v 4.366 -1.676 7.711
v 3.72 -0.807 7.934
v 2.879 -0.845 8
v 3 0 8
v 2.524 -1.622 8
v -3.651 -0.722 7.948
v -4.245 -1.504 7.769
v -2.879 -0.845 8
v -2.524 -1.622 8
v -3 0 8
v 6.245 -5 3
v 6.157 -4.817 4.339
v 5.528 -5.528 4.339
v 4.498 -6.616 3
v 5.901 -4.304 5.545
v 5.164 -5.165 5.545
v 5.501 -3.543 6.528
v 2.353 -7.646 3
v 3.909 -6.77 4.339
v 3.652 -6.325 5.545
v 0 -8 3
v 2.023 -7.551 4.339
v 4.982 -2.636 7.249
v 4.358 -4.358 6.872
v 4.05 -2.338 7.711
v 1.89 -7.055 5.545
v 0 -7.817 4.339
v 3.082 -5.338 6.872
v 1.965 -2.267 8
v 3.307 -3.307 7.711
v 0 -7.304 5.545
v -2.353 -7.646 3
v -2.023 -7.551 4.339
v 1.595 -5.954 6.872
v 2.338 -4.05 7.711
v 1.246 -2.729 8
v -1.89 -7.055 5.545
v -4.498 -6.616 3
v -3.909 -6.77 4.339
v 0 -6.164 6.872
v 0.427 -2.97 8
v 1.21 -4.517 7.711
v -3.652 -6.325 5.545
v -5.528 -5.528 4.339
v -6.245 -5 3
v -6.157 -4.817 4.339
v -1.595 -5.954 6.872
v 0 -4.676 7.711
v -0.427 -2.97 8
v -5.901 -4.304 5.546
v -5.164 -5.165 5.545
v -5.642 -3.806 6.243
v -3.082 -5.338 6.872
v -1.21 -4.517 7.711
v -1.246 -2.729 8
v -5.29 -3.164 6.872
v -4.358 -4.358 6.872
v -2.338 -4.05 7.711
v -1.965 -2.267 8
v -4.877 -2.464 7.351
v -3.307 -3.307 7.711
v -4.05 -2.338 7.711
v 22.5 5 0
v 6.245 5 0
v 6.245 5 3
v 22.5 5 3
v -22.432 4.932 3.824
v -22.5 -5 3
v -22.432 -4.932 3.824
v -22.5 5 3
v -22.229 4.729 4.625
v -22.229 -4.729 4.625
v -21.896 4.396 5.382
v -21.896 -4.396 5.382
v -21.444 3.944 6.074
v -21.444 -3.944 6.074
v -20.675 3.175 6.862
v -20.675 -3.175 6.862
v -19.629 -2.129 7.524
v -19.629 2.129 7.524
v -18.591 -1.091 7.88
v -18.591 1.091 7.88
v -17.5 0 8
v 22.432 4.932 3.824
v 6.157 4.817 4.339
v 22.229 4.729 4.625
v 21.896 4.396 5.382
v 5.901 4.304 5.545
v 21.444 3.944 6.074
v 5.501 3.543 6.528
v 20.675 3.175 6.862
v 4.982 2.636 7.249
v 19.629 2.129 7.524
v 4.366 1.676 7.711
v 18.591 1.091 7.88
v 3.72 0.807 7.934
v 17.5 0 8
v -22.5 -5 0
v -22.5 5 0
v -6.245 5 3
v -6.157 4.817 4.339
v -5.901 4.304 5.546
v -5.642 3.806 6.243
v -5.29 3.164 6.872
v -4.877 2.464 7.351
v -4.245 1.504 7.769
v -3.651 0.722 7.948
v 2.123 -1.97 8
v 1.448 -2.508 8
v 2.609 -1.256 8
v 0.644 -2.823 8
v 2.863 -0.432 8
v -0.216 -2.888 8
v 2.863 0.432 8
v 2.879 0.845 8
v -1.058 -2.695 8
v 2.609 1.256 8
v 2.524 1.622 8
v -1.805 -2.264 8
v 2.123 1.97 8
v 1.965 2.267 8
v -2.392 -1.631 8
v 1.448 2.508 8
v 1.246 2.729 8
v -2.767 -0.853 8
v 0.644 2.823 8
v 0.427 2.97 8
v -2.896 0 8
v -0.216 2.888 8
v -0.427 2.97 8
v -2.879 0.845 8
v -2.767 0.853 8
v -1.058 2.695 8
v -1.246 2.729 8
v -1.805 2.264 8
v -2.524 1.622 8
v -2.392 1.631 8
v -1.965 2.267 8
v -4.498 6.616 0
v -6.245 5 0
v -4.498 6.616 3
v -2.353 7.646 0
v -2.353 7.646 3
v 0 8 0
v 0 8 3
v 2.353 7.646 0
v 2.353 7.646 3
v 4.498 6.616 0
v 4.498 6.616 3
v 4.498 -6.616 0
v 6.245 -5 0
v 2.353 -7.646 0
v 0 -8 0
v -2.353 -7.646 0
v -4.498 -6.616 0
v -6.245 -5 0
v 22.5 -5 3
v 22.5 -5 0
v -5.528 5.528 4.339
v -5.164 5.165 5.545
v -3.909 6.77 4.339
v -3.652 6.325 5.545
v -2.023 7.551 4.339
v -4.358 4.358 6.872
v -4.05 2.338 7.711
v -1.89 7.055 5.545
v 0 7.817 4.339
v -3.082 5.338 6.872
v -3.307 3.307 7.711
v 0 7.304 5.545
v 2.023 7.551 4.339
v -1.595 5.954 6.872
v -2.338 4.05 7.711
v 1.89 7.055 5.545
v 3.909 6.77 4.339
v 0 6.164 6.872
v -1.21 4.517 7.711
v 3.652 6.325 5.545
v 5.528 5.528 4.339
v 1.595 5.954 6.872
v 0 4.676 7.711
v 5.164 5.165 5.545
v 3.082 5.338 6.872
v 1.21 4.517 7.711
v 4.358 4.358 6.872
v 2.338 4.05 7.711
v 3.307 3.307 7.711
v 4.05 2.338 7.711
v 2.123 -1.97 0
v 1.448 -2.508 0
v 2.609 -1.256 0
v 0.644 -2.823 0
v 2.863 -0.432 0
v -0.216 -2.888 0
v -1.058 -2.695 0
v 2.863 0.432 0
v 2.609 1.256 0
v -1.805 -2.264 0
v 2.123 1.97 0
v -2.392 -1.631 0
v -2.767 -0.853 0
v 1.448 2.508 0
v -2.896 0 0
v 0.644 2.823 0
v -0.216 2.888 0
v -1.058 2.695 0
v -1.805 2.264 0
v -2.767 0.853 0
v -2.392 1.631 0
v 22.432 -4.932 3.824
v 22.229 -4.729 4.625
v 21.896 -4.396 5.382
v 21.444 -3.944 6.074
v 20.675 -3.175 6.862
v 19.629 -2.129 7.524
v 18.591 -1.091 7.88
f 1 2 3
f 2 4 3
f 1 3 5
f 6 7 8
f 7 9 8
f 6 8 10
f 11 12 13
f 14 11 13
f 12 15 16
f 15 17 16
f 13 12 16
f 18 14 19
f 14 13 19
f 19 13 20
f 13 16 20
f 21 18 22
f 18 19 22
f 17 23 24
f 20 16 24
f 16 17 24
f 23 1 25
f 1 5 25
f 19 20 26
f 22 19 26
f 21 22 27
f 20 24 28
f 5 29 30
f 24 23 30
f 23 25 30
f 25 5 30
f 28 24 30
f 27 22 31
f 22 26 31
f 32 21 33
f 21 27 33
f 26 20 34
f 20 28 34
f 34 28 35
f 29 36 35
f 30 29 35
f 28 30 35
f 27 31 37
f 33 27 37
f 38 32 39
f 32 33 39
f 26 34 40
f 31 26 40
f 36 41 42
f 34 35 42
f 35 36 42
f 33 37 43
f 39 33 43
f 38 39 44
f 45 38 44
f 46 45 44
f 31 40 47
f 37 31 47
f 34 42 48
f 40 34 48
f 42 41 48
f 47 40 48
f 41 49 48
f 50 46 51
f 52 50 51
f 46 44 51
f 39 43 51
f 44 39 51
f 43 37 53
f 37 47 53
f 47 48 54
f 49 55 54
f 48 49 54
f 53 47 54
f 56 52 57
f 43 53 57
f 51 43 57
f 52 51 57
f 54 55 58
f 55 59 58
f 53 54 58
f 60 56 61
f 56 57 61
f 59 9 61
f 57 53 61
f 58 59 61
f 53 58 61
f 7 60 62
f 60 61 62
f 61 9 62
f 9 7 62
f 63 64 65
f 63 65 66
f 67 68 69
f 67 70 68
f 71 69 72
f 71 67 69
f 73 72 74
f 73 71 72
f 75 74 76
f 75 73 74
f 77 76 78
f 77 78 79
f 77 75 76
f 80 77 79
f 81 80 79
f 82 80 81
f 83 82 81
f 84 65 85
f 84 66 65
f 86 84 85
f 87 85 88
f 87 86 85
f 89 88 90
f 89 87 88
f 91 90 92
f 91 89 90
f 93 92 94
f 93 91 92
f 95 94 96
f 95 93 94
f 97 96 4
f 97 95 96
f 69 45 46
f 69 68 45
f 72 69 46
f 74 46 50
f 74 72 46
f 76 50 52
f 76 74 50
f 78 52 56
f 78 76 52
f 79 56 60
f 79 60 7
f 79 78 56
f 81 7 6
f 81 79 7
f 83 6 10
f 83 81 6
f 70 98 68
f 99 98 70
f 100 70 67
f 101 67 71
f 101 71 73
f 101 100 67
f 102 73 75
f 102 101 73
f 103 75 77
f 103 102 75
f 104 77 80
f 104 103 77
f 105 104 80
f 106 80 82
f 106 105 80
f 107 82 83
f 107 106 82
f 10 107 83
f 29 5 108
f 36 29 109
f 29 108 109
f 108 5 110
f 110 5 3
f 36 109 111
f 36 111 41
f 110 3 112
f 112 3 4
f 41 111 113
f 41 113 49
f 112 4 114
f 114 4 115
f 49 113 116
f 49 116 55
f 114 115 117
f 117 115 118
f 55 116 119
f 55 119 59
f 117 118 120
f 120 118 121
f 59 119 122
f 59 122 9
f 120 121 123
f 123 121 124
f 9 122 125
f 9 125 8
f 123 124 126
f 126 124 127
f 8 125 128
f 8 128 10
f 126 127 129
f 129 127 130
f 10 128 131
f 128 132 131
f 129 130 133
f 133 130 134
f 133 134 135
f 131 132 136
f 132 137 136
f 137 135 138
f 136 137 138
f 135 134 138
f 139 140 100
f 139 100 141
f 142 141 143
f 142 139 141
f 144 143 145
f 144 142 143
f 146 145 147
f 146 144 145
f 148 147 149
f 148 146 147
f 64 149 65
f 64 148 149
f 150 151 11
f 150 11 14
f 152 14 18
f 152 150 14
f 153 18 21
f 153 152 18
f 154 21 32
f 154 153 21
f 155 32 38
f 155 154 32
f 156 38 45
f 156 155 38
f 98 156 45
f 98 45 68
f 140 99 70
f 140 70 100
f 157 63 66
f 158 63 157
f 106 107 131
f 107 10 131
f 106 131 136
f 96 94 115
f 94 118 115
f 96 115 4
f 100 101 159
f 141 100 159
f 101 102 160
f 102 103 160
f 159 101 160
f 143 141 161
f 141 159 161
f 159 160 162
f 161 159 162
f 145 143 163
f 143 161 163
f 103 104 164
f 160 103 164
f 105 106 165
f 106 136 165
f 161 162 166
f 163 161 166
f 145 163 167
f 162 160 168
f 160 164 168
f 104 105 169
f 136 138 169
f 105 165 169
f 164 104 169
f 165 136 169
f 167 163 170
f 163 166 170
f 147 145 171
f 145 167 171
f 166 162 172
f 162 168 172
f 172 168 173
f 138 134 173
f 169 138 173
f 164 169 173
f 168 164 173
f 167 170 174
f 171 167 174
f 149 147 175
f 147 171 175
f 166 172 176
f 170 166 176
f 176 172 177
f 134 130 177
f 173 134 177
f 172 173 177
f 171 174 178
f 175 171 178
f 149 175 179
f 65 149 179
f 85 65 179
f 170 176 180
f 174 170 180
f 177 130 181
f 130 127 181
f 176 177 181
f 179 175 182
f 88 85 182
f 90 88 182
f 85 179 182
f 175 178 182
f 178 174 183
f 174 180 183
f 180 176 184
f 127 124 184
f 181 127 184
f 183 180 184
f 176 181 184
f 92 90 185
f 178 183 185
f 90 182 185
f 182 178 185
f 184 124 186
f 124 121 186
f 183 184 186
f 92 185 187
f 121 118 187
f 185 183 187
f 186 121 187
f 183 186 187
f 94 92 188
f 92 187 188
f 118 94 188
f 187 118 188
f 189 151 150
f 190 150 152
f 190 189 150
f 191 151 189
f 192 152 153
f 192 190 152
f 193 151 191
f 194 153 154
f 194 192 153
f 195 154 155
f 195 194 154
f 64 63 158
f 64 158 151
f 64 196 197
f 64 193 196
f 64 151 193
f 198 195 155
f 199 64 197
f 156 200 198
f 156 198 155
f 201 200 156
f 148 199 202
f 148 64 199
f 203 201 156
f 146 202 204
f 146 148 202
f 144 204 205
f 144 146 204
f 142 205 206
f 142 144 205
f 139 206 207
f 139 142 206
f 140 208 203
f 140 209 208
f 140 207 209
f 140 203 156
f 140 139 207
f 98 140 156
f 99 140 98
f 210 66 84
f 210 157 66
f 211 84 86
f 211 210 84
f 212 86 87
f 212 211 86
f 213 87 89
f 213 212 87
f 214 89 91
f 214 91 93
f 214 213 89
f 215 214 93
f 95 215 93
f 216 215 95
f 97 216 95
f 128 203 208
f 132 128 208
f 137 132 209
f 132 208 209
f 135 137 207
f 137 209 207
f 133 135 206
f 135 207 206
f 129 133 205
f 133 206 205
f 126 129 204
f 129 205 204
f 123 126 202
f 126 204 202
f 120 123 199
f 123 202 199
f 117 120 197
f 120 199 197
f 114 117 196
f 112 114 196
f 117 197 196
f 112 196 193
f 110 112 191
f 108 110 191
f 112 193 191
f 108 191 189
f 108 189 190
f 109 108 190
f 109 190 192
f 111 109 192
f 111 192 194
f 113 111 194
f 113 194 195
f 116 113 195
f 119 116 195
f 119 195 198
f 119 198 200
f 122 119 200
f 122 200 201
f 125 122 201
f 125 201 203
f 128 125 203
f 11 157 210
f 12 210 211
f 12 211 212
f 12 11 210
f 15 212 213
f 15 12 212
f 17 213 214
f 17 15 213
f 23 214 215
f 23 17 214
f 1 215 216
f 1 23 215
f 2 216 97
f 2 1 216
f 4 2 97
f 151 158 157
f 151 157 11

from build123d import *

# Parameters (mm, degrees)
BOSS_EXTRU_2_DEPTH = 8
CONG_1_R           = 5
D_GAGEMENT_121_D   = 5.7912


with BuildPart() as part:
    # Esquisse1 → Boss.-Extru.2 (new body)
    with BuildSketch(Plane.XY):
        with BuildLine():
            Line((-22.5, 5), (-6.244997998, 5))
            ThreePointArc((-6.244997998, 5), (0, 8), (6.244997998, 5))
            Line((6.244997998, 5), (22.5, 5))
            Line((22.5, 5), (22.5, -5))
            Line((22.5, -5), (6.244997998, -5))
            ThreePointArc((6.244997998, -5), (0, -8), (-6.244997998, -5))
            Line((-6.244997998, -5), (-22.5, -5))
            Line((-22.5, -5), (-22.5, 5))
        make_face()
    extrude(amount=BOSS_EXTRU_2_DEPTH)

    # Congé1
    cong_1_edges = [part.edges().sort_by_distance(p)[0] for p in [
        (0, -8, 8),
        (14.372498999, -5, 8),
        (22.5, 0, 8),
        (14.372498999, 5, 8),
        (0, 8, 8),
        (-14.372498999, 5, 8),
        (-22.5, 0, 8),
        (-14.372498999, -5, 8),
    ]]
    fillet(cong_1_edges, radius=CONG_1_R - 0.0001)  # a hair under: the kernel refuses the full size

    # Dégagement #121 (through all)
    with Locations(Plane.XY.offset(8)):
        with Locations((0, 0)):
            Hole(D_GAGEMENT_121_D / 2)


solid = part.part
